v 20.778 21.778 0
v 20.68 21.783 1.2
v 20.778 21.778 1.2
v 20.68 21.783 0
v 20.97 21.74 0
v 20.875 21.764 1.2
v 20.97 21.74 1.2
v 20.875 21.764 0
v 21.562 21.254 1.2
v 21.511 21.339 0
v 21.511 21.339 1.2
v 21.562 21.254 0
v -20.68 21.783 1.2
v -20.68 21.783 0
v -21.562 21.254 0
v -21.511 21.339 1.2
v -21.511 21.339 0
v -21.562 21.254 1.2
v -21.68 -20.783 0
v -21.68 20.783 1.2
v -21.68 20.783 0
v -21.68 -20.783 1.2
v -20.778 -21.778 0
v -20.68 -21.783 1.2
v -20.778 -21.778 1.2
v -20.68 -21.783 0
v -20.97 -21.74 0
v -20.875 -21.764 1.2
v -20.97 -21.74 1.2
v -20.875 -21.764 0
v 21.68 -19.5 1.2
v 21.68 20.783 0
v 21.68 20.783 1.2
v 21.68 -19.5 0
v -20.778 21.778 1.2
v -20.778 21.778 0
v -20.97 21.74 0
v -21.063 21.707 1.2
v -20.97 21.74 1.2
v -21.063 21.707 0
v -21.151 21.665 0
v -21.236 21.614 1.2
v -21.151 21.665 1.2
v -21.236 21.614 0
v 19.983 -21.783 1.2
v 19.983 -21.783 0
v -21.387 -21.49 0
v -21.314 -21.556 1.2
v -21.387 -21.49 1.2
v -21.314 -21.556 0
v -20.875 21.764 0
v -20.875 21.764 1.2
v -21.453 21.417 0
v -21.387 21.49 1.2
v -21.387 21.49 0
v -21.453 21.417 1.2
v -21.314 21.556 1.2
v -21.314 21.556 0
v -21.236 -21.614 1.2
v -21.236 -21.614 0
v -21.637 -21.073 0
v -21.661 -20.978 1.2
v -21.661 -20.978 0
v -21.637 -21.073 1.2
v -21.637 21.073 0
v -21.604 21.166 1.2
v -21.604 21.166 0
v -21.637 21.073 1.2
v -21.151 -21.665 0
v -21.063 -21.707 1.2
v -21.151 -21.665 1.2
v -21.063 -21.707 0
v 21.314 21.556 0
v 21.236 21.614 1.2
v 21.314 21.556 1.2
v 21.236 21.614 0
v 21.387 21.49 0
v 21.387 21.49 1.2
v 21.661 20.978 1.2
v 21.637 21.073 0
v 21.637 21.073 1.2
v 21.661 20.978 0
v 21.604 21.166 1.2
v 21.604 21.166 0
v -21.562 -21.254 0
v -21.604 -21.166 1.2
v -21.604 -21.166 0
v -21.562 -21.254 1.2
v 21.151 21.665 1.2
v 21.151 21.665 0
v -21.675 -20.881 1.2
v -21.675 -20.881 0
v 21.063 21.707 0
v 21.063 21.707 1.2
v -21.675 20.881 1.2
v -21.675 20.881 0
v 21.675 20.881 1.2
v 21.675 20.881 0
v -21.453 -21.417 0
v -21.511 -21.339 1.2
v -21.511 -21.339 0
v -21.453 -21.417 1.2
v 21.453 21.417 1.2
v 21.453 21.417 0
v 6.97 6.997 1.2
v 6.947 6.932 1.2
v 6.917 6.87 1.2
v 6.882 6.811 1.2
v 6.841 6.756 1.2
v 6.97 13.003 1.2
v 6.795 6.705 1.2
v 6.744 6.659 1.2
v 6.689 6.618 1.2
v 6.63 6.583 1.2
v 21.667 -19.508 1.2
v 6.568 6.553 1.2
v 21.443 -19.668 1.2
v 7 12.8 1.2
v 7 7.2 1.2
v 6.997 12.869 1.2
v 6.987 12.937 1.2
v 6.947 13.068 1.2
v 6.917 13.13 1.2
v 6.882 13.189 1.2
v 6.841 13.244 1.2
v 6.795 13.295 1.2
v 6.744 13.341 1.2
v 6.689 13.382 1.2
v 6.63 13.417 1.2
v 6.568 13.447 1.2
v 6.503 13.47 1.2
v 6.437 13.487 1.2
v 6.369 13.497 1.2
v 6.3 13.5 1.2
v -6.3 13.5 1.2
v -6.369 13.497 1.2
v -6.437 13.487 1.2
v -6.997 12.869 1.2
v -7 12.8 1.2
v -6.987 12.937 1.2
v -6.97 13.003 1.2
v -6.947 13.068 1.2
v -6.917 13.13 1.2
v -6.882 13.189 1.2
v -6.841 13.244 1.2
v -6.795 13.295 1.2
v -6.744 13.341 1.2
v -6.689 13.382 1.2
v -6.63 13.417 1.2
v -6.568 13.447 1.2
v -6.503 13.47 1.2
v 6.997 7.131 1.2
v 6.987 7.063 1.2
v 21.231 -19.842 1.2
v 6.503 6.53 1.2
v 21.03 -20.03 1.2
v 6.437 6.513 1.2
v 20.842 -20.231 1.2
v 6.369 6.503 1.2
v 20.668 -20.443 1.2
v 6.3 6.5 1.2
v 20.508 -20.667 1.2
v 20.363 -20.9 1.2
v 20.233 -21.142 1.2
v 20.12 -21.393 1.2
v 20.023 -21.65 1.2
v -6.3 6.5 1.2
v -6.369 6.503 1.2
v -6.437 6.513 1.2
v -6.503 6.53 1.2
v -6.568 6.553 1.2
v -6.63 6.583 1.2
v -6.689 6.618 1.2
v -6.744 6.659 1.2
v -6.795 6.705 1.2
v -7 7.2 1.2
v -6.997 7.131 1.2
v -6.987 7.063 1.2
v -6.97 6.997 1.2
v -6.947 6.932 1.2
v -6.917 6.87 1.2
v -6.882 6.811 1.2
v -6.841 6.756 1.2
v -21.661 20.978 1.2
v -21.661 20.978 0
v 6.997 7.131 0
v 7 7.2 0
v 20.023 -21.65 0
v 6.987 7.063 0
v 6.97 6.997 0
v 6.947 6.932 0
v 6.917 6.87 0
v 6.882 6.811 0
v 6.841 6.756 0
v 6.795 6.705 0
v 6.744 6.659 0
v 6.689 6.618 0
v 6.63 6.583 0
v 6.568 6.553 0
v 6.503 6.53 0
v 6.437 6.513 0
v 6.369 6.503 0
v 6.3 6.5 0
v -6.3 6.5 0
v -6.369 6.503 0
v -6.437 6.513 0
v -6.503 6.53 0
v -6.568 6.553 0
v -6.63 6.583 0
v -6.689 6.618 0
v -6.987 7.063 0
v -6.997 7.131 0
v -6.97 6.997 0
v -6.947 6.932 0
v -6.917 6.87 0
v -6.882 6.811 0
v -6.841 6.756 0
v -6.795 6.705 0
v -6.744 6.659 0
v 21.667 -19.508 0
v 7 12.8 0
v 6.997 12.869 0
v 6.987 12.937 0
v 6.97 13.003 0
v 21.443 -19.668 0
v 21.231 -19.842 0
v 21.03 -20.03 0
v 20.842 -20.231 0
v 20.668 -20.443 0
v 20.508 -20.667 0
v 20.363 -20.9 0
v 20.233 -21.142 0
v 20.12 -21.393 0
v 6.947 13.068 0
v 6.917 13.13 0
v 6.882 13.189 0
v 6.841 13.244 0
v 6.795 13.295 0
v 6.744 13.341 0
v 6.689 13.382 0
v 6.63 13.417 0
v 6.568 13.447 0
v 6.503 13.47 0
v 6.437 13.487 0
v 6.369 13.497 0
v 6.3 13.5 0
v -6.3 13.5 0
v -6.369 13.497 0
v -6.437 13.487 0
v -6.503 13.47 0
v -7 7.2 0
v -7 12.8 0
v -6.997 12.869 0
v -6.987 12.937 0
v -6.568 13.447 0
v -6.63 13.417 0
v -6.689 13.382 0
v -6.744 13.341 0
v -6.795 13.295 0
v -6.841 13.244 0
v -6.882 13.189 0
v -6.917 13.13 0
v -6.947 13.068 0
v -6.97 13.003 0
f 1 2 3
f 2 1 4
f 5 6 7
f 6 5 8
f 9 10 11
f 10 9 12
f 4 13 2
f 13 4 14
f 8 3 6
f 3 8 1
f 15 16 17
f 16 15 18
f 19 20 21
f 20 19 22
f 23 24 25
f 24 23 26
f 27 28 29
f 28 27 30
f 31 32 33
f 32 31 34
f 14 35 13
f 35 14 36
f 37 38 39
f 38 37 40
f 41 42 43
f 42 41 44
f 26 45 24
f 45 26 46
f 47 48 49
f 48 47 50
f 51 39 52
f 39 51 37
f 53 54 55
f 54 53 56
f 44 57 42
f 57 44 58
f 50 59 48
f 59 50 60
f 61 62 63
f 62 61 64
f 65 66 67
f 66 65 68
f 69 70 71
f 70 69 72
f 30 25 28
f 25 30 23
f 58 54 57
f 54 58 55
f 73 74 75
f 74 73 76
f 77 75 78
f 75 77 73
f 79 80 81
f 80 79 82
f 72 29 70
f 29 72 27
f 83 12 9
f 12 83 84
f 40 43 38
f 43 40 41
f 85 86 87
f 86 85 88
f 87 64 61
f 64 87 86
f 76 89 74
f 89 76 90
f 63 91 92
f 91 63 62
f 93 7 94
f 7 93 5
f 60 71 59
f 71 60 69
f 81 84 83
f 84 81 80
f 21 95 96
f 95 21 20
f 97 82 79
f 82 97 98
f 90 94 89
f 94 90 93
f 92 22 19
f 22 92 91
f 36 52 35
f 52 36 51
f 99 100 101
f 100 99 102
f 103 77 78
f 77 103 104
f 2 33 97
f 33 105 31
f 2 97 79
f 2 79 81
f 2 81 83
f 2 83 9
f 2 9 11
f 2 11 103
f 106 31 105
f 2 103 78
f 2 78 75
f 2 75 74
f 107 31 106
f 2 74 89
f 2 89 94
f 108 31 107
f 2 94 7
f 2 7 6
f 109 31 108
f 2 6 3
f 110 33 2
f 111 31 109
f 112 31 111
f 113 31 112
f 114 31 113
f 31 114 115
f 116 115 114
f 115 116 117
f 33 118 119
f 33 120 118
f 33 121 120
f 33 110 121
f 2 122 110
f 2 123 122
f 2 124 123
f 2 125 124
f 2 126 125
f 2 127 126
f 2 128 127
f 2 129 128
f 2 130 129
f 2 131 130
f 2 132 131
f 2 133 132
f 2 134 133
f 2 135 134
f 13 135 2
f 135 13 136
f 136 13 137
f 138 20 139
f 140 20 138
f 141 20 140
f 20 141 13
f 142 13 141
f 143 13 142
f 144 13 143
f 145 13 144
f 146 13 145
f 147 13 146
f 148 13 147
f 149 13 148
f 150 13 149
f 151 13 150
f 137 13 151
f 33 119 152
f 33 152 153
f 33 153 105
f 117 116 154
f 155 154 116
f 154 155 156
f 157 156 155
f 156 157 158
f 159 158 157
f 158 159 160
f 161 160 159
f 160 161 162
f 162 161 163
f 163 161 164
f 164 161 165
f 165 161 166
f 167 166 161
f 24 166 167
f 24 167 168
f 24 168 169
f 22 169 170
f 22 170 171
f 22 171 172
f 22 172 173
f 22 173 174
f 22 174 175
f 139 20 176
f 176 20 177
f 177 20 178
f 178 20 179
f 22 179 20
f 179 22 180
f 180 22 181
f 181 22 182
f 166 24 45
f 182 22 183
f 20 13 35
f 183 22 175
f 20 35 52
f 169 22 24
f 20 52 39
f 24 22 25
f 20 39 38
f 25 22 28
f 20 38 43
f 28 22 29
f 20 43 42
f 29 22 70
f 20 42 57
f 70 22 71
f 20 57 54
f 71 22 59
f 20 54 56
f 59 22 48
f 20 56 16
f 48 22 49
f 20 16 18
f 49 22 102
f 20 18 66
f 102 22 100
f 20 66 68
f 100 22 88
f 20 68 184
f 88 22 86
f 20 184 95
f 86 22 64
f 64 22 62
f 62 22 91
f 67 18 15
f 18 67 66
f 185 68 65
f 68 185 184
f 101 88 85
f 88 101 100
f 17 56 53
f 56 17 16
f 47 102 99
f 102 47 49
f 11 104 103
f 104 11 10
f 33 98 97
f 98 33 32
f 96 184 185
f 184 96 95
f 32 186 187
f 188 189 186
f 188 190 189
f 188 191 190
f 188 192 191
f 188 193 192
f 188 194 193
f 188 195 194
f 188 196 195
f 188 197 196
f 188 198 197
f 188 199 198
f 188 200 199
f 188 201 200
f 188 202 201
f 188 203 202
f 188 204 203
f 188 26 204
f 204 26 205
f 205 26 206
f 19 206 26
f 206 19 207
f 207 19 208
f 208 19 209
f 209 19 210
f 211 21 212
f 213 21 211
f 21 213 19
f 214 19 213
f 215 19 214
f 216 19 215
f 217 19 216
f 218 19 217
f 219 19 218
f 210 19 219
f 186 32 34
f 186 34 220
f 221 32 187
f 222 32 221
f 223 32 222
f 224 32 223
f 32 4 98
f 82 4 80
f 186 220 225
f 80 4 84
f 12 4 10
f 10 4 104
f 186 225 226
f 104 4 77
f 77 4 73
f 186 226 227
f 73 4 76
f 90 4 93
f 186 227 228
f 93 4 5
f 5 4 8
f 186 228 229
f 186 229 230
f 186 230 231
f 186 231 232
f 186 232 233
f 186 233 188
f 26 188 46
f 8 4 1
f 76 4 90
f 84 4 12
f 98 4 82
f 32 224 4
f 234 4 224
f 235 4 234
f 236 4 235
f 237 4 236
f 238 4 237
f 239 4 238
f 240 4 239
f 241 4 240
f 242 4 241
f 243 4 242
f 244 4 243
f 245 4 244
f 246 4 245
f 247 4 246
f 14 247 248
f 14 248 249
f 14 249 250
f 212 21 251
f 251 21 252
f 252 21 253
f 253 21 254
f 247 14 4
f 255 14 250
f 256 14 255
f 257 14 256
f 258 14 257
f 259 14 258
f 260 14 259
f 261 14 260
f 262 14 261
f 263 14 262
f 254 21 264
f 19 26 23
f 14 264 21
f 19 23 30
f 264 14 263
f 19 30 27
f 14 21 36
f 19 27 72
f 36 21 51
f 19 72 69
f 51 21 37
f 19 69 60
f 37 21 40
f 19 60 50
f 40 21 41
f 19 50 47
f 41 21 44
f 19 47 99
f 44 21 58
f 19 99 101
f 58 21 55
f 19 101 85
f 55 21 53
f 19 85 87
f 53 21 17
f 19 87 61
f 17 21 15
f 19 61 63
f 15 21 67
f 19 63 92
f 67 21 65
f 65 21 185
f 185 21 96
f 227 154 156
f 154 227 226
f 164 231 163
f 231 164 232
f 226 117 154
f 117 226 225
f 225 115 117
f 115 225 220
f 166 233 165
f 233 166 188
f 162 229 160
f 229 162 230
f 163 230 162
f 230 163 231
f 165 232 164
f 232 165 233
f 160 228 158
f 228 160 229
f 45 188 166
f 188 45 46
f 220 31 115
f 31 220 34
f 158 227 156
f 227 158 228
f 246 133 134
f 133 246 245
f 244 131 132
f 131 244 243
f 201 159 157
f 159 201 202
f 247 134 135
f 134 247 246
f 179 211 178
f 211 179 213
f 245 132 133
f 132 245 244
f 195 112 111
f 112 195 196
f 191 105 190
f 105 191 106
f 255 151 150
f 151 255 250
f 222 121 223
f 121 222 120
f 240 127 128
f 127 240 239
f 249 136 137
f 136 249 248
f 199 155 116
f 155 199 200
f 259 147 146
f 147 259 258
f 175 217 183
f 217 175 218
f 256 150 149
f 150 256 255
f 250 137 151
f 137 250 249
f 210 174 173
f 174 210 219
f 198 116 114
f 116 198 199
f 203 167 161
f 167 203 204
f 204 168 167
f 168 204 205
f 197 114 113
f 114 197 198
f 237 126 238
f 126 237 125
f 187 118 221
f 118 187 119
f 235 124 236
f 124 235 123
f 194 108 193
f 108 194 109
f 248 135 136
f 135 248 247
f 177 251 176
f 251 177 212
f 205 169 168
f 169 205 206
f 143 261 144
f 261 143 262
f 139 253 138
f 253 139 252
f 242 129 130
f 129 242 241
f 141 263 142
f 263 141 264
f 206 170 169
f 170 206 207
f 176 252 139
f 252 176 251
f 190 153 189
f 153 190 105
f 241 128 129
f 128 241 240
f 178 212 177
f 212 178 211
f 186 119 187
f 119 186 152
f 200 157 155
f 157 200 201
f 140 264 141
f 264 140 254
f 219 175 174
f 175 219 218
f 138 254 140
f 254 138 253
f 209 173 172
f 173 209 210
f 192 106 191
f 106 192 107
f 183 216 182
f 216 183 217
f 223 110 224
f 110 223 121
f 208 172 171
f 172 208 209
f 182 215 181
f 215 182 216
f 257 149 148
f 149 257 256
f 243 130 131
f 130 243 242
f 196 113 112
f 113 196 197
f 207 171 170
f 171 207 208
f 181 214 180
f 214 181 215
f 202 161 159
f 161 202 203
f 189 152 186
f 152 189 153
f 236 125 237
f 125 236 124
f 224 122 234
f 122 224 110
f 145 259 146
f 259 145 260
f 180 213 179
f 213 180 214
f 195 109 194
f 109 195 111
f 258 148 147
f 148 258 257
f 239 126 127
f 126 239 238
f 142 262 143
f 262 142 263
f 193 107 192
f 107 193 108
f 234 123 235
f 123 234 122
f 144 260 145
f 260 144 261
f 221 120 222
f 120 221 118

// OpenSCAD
// Glue-on cover for the first (2x4) board, near-box row, second from left
// in the delivered front-facing view. Local +Y points toward the box;
// the adjacent center foot is at the cover's upper-right corner.
use <lamp-base-plate.scad>
part="print"; // [print,installed,assembly,detail,collision]
overlap=2.5;
skin=1.2;
lip_clearance=0; // User confirmed retaining lips have been removed.
cover_height=skin+lip_clearance;
cover_size=[38.36+2*overlap,38.566+2*overlap];
pocket_size=[40.36,40.566]; // Clears the existing lips by 0.3 mm per side.
foot_notch_radius=4.2; // Clears even the original 7 mm TPU head by 0.7 mm.
$fn=96;

module cover() {
    difference() {
        linear_extrude(cover_height) rounded_rect(cover_size[0],cover_size[1],1);
        translate([24,23,-0.02]) cylinder(r=foot_notch_radius,h=cover_height+0.04);
        translate([0,-10,0]) slot([14,7],-0.02,cover_height+0.04);
        if(lip_clearance>0)
            translate([0,0,-0.02]) linear_extrude(lip_clearance+0.02)
                rounded_rect(pocket_size[0],pocket_size[1],0.4);
    }
}
module installed_cover() {
    // Corresponds to lamp at (124,101) in the original board coordinates.
    translate([124,101,4]) rotate([0,0,180]) cover();
}
module supporting_board() {
    // Represent the reported physical board: target lips trimmed flush.
    difference() {
        plate();
        translate([102,79,4]) cube([44,44,2]);
    }
}
module local_detail() {
    // Show the covered lamp position, a little deck around it and the foot.
    color([0.28,0.39,0.46]) difference() {
        translate([-28,-28,0]) cube([60,60,4]);
        rotate([0,0,180]) lamp_cut();
        translate([24,23,-0.02]) cylinder(d=5.8,h=4.04);
    }
    if(lip_clearance>0) color([0.28,0.39,0.46]) lamp_lips([1,1]);
    translate([24,23,-10]) color([0.18,0.21,0.23]) tpu_foot();
    translate([0,0,4]) color([0.88,0.59,0.22]) cover();
}

if(part=="print") {
    // Either broad face can sit on the bed for the flat 1.2 mm version.
    translate([0,0,cover_height]) rotate([180,0,0]) cover();
} else if(part=="installed") cover();
else if(part=="detail") local_detail();
else if(part=="assembly") {
    color([0.28,0.39,0.46]) supporting_board();
    color([0.88,0.59,0.22]) installed_cover();
    translate([100,78,-10]) color([0.18,0.21,0.23]) tpu_foot();
} else if(part=="collision") {
    intersection() {
        // Lift 0.01 mm to exclude intended coplanar glue-contact surfaces.
        translate([0,0,0.01]) installed_cover();
        union() {
            supporting_board();
            translate([100,78,-10]) tpu_foot();
            // Conservative envelope of every prior foot head version.
            translate([100,78,4]) cylinder(d=7,h=3);
        }
    }
} else assert(false,"Unknown part");
